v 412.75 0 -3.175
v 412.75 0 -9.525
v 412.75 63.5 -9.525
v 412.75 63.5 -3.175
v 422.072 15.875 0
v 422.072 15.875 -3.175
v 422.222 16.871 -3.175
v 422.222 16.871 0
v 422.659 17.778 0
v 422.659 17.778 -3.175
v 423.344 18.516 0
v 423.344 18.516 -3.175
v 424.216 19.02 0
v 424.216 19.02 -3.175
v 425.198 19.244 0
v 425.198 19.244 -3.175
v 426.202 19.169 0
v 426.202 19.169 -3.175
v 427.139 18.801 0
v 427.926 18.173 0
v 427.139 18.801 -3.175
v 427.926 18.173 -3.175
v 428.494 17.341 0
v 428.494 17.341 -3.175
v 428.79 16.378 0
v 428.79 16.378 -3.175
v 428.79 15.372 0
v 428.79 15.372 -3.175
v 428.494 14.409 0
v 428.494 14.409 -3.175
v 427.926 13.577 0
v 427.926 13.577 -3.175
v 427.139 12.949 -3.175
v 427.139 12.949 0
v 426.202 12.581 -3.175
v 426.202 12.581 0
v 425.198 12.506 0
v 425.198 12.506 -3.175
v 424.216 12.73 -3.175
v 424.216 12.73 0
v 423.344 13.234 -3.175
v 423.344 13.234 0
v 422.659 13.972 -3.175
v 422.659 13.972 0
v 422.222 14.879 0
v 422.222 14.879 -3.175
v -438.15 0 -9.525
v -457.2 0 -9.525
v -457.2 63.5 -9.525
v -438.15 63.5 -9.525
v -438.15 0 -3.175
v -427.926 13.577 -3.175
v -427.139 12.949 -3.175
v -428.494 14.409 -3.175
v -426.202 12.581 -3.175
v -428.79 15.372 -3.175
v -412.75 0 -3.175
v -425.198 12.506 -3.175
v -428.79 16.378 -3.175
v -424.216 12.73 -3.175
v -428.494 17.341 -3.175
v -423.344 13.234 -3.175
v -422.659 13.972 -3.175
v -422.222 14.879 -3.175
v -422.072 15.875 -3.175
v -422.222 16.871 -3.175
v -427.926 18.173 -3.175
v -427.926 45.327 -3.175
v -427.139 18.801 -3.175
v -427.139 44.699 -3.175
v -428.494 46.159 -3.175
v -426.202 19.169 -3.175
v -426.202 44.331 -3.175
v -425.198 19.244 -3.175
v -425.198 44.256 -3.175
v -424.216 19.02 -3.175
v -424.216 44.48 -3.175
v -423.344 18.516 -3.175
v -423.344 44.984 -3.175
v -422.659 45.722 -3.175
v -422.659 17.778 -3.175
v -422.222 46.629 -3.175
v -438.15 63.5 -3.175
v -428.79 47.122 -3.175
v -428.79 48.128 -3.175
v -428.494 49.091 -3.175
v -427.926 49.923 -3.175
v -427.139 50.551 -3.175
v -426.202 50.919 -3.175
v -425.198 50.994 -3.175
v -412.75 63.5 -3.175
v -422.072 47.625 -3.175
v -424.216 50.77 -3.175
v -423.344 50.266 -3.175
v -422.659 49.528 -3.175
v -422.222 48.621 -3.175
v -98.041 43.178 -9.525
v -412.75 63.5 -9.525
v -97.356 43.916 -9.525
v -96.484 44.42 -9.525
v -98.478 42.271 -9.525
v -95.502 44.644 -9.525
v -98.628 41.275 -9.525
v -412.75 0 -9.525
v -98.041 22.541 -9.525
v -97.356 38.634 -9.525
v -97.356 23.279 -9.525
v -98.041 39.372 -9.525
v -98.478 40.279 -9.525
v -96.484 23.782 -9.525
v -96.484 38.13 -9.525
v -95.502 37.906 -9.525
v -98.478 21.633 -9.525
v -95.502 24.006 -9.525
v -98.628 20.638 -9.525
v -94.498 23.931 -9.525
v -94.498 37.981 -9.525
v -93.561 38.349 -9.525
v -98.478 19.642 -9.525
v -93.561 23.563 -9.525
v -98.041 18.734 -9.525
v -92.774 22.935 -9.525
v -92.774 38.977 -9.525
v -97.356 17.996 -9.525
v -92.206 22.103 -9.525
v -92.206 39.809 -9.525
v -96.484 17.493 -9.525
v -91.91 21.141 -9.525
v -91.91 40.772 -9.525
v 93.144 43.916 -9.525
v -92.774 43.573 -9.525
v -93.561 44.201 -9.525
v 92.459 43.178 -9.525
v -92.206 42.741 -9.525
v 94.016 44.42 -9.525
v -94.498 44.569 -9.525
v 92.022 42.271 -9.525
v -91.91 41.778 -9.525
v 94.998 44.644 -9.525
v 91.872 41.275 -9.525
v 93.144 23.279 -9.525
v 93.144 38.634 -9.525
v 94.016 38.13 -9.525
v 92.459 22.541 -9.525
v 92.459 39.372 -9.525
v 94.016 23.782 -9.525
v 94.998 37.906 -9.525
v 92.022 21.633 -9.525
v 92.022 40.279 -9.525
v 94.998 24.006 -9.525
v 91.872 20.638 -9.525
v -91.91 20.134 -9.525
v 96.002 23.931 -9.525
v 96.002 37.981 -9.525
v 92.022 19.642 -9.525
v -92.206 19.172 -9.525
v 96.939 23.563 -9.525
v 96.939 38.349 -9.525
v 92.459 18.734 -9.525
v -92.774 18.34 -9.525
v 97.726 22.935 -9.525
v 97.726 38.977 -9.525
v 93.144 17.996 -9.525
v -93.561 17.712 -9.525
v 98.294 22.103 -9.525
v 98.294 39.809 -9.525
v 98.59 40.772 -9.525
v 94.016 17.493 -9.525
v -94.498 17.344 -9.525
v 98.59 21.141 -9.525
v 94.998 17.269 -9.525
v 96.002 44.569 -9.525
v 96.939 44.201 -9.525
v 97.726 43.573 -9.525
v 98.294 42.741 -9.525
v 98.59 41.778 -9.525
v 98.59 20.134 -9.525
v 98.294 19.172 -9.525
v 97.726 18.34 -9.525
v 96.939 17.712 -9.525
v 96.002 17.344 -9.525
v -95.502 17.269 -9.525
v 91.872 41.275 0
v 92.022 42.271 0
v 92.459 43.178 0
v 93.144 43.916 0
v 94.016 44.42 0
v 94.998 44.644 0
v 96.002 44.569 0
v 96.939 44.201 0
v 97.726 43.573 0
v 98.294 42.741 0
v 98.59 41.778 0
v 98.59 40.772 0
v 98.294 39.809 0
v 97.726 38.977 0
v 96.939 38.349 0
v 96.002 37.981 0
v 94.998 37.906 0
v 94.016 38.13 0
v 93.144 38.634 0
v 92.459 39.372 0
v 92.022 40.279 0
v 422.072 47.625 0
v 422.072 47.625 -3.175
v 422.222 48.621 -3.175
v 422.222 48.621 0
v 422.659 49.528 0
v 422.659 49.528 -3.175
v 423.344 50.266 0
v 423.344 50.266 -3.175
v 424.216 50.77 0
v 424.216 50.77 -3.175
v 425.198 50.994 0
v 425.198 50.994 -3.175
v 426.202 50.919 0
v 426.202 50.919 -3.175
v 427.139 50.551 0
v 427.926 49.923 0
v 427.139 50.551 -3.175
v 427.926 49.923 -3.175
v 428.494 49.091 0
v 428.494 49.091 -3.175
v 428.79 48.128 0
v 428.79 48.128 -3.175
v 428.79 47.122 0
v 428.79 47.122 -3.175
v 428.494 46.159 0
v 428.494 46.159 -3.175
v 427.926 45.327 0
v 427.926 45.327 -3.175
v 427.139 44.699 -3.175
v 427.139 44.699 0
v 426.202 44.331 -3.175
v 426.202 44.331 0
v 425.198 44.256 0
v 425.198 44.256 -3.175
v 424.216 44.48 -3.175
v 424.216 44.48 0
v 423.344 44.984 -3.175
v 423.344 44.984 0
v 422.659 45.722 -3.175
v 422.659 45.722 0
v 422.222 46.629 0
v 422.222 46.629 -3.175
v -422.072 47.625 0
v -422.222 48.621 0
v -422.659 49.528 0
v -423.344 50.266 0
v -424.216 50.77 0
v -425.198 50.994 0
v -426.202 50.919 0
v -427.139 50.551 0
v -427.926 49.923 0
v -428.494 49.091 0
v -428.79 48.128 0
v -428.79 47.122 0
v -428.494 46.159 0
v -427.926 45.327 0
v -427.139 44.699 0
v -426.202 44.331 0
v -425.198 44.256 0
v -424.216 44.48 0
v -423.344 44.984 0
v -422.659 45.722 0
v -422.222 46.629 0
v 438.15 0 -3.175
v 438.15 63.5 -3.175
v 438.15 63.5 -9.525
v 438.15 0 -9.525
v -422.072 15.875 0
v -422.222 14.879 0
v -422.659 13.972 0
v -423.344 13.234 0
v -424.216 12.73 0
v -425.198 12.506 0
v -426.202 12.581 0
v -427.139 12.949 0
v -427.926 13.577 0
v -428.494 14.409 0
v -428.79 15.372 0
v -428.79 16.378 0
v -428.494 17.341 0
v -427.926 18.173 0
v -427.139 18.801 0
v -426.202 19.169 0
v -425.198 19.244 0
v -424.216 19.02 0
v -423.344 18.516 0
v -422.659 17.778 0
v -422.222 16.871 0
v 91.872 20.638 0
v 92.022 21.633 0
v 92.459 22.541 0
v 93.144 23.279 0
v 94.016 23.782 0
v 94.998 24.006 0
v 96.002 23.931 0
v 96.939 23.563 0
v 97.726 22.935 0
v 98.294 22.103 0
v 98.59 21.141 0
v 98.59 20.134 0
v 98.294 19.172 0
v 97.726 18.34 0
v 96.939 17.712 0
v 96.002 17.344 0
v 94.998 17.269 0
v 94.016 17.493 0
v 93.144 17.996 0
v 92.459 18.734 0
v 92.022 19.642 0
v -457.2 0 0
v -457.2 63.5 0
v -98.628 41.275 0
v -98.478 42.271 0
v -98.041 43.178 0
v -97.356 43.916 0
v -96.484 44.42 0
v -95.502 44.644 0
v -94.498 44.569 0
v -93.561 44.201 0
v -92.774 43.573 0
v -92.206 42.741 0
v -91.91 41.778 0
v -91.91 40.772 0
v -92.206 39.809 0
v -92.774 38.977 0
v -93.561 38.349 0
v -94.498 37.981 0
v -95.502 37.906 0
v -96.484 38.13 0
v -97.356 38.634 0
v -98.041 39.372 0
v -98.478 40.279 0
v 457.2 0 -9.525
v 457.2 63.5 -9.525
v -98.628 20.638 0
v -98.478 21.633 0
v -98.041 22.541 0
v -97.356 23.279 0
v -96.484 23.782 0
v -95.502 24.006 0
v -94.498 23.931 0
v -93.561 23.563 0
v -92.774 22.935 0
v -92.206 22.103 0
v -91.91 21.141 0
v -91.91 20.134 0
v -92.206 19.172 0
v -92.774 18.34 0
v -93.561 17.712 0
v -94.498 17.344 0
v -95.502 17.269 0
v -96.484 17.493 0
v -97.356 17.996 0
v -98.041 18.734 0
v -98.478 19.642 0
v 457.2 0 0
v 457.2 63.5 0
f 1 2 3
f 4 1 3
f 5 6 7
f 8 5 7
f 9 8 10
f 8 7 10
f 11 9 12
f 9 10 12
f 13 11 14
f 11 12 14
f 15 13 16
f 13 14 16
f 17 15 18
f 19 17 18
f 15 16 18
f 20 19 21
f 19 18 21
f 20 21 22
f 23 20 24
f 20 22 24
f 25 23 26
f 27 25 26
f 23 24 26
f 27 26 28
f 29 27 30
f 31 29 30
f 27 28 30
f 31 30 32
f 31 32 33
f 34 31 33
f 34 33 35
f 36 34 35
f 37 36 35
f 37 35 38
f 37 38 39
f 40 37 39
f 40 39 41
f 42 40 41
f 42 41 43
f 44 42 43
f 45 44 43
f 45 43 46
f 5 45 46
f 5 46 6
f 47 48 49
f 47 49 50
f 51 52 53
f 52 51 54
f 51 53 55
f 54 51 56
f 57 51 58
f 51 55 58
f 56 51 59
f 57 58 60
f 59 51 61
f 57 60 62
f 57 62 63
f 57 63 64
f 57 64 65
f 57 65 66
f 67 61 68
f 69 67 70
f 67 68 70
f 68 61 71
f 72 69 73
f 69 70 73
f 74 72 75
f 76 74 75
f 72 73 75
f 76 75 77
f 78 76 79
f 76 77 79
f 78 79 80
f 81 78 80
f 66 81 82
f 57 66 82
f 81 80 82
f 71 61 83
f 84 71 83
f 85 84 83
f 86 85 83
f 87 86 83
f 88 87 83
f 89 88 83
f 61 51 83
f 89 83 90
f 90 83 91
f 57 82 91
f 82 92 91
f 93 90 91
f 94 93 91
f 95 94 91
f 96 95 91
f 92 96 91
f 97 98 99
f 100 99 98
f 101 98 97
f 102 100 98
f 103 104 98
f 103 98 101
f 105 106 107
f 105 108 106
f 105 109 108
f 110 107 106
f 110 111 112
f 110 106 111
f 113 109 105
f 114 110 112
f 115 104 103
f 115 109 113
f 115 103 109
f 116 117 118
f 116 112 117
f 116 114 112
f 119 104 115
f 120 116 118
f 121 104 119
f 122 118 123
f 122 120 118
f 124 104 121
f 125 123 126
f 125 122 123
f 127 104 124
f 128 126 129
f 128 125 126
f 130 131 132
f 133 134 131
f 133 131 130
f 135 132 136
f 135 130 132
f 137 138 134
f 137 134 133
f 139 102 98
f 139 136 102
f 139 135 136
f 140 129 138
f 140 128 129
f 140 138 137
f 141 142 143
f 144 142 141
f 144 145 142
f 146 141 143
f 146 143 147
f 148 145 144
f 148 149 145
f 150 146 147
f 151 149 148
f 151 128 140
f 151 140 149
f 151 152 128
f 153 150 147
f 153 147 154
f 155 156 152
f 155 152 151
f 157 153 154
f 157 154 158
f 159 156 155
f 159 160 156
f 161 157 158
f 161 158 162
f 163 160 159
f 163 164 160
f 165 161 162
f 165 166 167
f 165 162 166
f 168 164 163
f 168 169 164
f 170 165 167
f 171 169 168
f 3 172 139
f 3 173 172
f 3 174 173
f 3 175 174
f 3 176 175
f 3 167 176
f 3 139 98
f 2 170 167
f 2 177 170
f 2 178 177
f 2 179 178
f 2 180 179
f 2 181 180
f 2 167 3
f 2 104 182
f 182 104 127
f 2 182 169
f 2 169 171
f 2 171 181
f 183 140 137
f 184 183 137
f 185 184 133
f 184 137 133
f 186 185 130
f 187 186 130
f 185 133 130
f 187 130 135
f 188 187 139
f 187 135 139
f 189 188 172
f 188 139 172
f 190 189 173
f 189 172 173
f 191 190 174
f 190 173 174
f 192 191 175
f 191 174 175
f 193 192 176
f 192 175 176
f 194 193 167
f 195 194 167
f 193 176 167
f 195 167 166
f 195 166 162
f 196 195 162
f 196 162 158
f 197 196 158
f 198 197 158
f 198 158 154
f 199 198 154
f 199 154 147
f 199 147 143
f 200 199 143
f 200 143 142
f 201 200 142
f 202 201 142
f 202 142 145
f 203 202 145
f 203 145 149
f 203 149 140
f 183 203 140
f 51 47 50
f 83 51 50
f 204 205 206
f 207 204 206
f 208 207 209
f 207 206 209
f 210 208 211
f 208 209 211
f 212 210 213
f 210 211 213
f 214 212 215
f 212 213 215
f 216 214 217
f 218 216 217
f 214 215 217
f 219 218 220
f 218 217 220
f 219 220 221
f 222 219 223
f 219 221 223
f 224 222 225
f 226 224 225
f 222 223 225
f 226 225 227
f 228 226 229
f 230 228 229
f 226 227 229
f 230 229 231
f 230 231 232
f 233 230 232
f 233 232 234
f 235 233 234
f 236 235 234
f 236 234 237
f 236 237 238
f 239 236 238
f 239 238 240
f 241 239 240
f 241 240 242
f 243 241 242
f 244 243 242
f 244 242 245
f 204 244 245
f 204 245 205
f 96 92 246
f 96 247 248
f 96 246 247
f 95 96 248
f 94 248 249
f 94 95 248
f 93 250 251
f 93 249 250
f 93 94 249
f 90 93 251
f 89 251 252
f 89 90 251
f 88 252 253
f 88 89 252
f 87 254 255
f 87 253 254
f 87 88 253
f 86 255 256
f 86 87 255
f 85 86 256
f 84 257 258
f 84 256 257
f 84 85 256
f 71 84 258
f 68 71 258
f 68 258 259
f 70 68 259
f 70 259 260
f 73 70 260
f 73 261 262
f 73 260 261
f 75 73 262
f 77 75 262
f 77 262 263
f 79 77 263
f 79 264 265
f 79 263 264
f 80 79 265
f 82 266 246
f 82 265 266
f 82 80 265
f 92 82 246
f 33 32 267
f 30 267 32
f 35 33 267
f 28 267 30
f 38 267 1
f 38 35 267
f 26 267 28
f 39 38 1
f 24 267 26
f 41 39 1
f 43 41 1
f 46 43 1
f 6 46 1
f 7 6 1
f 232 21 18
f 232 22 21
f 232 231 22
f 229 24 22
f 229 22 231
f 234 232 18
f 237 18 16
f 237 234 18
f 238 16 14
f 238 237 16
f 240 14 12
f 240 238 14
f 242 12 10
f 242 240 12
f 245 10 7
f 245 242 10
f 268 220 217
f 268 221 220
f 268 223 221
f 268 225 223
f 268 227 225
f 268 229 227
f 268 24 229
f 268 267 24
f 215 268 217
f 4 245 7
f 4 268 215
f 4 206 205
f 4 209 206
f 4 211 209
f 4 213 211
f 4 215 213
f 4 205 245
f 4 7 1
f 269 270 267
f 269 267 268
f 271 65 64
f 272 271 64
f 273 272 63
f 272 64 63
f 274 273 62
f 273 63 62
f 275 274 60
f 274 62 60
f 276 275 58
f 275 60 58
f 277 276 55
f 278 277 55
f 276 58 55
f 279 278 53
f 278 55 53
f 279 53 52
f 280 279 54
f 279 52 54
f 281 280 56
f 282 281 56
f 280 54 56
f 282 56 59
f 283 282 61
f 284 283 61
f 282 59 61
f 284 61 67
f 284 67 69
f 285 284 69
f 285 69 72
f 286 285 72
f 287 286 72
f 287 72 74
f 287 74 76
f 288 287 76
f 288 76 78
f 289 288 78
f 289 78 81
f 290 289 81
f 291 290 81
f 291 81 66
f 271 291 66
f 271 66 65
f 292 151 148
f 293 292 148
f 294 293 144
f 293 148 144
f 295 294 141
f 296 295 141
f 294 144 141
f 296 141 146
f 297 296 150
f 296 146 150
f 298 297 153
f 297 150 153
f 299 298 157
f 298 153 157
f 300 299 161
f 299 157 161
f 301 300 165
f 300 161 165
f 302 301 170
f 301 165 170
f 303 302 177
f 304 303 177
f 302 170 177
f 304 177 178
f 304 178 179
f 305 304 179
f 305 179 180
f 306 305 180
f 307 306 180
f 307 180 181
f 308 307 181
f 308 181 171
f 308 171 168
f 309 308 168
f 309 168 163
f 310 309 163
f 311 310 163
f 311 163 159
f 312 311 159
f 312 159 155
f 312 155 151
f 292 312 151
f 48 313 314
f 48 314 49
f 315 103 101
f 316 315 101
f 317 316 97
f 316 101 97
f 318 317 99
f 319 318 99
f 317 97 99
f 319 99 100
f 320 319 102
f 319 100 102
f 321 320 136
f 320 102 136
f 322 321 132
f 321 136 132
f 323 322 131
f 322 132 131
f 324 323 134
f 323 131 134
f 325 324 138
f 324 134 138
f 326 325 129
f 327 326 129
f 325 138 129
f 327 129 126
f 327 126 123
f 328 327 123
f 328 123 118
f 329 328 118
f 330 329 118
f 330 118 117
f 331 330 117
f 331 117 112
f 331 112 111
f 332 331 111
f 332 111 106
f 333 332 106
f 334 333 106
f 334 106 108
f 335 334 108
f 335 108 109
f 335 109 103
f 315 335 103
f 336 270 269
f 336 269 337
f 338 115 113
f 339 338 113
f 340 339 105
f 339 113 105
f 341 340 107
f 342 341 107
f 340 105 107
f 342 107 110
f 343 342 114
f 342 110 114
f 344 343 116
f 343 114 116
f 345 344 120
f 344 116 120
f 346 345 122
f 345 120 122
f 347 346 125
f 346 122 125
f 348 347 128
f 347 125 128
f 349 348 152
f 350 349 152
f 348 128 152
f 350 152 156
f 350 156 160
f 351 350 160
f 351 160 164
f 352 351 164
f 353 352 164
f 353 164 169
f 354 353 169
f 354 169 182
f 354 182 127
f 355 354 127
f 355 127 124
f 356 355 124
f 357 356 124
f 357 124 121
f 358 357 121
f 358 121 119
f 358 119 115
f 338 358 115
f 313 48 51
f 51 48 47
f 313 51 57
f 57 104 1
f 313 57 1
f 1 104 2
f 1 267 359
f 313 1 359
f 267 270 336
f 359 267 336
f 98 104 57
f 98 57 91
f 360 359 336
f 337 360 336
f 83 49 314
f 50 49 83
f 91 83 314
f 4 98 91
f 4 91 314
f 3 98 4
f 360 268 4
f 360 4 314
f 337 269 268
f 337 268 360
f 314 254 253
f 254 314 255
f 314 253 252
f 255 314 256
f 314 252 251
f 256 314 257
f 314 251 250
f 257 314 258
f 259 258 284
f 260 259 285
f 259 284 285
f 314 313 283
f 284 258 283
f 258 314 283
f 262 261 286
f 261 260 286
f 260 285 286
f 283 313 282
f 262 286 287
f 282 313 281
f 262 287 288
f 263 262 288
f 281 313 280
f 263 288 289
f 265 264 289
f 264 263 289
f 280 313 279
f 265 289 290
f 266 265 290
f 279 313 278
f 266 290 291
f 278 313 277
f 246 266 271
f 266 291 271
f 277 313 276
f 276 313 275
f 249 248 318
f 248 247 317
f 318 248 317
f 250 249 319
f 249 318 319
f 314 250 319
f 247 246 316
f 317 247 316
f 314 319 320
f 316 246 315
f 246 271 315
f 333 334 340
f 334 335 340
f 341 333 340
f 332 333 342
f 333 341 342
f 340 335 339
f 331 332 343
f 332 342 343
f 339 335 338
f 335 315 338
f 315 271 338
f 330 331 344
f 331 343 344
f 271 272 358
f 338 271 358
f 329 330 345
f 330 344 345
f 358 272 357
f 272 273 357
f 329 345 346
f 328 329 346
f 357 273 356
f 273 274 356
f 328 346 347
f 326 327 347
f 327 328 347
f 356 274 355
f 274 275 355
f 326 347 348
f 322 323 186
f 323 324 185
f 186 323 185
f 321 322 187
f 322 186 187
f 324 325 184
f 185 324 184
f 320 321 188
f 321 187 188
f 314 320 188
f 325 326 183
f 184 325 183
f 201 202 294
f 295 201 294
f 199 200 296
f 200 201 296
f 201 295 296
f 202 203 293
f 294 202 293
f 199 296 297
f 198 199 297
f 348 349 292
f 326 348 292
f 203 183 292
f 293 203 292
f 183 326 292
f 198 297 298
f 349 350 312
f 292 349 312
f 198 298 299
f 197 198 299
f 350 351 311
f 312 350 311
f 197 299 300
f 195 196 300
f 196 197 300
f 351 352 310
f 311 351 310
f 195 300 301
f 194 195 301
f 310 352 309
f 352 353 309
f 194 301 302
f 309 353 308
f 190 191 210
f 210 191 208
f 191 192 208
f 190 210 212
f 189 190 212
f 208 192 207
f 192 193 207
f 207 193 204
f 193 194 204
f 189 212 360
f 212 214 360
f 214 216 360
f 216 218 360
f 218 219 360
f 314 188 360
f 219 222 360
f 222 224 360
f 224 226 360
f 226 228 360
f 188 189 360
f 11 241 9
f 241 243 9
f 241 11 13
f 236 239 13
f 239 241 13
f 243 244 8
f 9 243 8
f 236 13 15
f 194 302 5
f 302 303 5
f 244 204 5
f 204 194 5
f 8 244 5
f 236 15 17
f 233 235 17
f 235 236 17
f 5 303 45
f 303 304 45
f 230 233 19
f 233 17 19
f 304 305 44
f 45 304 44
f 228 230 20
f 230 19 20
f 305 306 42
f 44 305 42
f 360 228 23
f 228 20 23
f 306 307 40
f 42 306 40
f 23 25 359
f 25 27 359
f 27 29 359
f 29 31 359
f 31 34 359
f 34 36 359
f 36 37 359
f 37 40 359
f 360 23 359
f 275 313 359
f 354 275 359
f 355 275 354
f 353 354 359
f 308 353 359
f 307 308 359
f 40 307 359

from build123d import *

# Parameters (mm, degrees)
SKETCH1_W               = 914.4
SKETCH1_H               = 9.525
BOSS_EXTRUDE1_DEPTH     = 63.5
SKETCH2_W               = 25.4
SKETCH2_H               = 63.5
CUT_EXTRUDE1_DEPTH      = 6.35
F_1_4_CLEARANCE_HOLE1_D = 6.7564
F_1_4_CLEARANCE_HOLE2_D = 6.7564
LPATTERN1_COUNT         = 3
LPATTERN1_PITCH         = 15.875
MIRROR1_COPY_1_D        = 6.7564


with BuildPart() as part:
    # Sketch1 → Boss-Extrude1 (new body)
    with BuildSketch(Plane(origin=(0, 0, 0), x_dir=(1, 0, 0), z_dir=(0, 1, 0))):
        with Locations((0, 4.7625)):
            Rectangle(SKETCH1_W, SKETCH1_H)
    extrude(amount=BOSS_EXTRUDE1_DEPTH)

    # Sketch2 → Cut-Extrude1 (cut)
    with BuildSketch(Plane(origin=(0, 0, -9.525), x_dir=(-1, 0, 0), z_dir=(0, 0, -1))):
        with Locations((-425.45, 31.75)):
            Rectangle(SKETCH2_W, SKETCH2_H)
    cut_extrude1 = extrude(amount=-CUT_EXTRUDE1_DEPTH, mode=Mode.SUBTRACT)

    # 1/4 Clearance Hole1 (through all)
    with Locations(Plane.XY):
        with Locations((425.45, 47.625)):
            f_1_4_clearance_hole1 = Hole(F_1_4_CLEARANCE_HOLE1_D / 2)

    # 1/4 Clearance Hole2 (through all)
    with Locations(Plane.XY):
        with Locations((-95.25, 41.275), (-95.25, 20.6375), (95.25, 41.275), (95.25, 20.6375)):
            Hole(F_1_4_CLEARANCE_HOLE2_D / 2)

    # LPattern1: 1/4 Clearance Hole1 ×3, 1 skipped
    with Locations(*[(0, -i * LPATTERN1_PITCH, 0) for i in range(1, LPATTERN1_COUNT) if i not in (1,)]):
        add(f_1_4_clearance_hole1, mode=Mode.SUBTRACT)

    # Mirror1: Cut-Extrude1, 1/4 Clearance Hole1 across plane
    add(cut_extrude1.mirror(Plane(origin=(0, 0, 0), x_dir=(0, 0, 1), z_dir=(1, 0, 0))), mode=Mode.SUBTRACT)
    add(f_1_4_clearance_hole1.mirror(Plane(origin=(0, 0, 0), x_dir=(0, 0, 1), z_dir=(1, 0, 0))), mode=Mode.SUBTRACT)

    # Mirror1 copy 1 (through all)
    with Locations(Plane(origin=(0, -31.75, 0), x_dir=(-1, 0, 0), z_dir=(0, 0, 1))):
        with Locations((425.45, -47.625)):
            Hole(MIRROR1_COPY_1_D / 2)


solid = part.part
